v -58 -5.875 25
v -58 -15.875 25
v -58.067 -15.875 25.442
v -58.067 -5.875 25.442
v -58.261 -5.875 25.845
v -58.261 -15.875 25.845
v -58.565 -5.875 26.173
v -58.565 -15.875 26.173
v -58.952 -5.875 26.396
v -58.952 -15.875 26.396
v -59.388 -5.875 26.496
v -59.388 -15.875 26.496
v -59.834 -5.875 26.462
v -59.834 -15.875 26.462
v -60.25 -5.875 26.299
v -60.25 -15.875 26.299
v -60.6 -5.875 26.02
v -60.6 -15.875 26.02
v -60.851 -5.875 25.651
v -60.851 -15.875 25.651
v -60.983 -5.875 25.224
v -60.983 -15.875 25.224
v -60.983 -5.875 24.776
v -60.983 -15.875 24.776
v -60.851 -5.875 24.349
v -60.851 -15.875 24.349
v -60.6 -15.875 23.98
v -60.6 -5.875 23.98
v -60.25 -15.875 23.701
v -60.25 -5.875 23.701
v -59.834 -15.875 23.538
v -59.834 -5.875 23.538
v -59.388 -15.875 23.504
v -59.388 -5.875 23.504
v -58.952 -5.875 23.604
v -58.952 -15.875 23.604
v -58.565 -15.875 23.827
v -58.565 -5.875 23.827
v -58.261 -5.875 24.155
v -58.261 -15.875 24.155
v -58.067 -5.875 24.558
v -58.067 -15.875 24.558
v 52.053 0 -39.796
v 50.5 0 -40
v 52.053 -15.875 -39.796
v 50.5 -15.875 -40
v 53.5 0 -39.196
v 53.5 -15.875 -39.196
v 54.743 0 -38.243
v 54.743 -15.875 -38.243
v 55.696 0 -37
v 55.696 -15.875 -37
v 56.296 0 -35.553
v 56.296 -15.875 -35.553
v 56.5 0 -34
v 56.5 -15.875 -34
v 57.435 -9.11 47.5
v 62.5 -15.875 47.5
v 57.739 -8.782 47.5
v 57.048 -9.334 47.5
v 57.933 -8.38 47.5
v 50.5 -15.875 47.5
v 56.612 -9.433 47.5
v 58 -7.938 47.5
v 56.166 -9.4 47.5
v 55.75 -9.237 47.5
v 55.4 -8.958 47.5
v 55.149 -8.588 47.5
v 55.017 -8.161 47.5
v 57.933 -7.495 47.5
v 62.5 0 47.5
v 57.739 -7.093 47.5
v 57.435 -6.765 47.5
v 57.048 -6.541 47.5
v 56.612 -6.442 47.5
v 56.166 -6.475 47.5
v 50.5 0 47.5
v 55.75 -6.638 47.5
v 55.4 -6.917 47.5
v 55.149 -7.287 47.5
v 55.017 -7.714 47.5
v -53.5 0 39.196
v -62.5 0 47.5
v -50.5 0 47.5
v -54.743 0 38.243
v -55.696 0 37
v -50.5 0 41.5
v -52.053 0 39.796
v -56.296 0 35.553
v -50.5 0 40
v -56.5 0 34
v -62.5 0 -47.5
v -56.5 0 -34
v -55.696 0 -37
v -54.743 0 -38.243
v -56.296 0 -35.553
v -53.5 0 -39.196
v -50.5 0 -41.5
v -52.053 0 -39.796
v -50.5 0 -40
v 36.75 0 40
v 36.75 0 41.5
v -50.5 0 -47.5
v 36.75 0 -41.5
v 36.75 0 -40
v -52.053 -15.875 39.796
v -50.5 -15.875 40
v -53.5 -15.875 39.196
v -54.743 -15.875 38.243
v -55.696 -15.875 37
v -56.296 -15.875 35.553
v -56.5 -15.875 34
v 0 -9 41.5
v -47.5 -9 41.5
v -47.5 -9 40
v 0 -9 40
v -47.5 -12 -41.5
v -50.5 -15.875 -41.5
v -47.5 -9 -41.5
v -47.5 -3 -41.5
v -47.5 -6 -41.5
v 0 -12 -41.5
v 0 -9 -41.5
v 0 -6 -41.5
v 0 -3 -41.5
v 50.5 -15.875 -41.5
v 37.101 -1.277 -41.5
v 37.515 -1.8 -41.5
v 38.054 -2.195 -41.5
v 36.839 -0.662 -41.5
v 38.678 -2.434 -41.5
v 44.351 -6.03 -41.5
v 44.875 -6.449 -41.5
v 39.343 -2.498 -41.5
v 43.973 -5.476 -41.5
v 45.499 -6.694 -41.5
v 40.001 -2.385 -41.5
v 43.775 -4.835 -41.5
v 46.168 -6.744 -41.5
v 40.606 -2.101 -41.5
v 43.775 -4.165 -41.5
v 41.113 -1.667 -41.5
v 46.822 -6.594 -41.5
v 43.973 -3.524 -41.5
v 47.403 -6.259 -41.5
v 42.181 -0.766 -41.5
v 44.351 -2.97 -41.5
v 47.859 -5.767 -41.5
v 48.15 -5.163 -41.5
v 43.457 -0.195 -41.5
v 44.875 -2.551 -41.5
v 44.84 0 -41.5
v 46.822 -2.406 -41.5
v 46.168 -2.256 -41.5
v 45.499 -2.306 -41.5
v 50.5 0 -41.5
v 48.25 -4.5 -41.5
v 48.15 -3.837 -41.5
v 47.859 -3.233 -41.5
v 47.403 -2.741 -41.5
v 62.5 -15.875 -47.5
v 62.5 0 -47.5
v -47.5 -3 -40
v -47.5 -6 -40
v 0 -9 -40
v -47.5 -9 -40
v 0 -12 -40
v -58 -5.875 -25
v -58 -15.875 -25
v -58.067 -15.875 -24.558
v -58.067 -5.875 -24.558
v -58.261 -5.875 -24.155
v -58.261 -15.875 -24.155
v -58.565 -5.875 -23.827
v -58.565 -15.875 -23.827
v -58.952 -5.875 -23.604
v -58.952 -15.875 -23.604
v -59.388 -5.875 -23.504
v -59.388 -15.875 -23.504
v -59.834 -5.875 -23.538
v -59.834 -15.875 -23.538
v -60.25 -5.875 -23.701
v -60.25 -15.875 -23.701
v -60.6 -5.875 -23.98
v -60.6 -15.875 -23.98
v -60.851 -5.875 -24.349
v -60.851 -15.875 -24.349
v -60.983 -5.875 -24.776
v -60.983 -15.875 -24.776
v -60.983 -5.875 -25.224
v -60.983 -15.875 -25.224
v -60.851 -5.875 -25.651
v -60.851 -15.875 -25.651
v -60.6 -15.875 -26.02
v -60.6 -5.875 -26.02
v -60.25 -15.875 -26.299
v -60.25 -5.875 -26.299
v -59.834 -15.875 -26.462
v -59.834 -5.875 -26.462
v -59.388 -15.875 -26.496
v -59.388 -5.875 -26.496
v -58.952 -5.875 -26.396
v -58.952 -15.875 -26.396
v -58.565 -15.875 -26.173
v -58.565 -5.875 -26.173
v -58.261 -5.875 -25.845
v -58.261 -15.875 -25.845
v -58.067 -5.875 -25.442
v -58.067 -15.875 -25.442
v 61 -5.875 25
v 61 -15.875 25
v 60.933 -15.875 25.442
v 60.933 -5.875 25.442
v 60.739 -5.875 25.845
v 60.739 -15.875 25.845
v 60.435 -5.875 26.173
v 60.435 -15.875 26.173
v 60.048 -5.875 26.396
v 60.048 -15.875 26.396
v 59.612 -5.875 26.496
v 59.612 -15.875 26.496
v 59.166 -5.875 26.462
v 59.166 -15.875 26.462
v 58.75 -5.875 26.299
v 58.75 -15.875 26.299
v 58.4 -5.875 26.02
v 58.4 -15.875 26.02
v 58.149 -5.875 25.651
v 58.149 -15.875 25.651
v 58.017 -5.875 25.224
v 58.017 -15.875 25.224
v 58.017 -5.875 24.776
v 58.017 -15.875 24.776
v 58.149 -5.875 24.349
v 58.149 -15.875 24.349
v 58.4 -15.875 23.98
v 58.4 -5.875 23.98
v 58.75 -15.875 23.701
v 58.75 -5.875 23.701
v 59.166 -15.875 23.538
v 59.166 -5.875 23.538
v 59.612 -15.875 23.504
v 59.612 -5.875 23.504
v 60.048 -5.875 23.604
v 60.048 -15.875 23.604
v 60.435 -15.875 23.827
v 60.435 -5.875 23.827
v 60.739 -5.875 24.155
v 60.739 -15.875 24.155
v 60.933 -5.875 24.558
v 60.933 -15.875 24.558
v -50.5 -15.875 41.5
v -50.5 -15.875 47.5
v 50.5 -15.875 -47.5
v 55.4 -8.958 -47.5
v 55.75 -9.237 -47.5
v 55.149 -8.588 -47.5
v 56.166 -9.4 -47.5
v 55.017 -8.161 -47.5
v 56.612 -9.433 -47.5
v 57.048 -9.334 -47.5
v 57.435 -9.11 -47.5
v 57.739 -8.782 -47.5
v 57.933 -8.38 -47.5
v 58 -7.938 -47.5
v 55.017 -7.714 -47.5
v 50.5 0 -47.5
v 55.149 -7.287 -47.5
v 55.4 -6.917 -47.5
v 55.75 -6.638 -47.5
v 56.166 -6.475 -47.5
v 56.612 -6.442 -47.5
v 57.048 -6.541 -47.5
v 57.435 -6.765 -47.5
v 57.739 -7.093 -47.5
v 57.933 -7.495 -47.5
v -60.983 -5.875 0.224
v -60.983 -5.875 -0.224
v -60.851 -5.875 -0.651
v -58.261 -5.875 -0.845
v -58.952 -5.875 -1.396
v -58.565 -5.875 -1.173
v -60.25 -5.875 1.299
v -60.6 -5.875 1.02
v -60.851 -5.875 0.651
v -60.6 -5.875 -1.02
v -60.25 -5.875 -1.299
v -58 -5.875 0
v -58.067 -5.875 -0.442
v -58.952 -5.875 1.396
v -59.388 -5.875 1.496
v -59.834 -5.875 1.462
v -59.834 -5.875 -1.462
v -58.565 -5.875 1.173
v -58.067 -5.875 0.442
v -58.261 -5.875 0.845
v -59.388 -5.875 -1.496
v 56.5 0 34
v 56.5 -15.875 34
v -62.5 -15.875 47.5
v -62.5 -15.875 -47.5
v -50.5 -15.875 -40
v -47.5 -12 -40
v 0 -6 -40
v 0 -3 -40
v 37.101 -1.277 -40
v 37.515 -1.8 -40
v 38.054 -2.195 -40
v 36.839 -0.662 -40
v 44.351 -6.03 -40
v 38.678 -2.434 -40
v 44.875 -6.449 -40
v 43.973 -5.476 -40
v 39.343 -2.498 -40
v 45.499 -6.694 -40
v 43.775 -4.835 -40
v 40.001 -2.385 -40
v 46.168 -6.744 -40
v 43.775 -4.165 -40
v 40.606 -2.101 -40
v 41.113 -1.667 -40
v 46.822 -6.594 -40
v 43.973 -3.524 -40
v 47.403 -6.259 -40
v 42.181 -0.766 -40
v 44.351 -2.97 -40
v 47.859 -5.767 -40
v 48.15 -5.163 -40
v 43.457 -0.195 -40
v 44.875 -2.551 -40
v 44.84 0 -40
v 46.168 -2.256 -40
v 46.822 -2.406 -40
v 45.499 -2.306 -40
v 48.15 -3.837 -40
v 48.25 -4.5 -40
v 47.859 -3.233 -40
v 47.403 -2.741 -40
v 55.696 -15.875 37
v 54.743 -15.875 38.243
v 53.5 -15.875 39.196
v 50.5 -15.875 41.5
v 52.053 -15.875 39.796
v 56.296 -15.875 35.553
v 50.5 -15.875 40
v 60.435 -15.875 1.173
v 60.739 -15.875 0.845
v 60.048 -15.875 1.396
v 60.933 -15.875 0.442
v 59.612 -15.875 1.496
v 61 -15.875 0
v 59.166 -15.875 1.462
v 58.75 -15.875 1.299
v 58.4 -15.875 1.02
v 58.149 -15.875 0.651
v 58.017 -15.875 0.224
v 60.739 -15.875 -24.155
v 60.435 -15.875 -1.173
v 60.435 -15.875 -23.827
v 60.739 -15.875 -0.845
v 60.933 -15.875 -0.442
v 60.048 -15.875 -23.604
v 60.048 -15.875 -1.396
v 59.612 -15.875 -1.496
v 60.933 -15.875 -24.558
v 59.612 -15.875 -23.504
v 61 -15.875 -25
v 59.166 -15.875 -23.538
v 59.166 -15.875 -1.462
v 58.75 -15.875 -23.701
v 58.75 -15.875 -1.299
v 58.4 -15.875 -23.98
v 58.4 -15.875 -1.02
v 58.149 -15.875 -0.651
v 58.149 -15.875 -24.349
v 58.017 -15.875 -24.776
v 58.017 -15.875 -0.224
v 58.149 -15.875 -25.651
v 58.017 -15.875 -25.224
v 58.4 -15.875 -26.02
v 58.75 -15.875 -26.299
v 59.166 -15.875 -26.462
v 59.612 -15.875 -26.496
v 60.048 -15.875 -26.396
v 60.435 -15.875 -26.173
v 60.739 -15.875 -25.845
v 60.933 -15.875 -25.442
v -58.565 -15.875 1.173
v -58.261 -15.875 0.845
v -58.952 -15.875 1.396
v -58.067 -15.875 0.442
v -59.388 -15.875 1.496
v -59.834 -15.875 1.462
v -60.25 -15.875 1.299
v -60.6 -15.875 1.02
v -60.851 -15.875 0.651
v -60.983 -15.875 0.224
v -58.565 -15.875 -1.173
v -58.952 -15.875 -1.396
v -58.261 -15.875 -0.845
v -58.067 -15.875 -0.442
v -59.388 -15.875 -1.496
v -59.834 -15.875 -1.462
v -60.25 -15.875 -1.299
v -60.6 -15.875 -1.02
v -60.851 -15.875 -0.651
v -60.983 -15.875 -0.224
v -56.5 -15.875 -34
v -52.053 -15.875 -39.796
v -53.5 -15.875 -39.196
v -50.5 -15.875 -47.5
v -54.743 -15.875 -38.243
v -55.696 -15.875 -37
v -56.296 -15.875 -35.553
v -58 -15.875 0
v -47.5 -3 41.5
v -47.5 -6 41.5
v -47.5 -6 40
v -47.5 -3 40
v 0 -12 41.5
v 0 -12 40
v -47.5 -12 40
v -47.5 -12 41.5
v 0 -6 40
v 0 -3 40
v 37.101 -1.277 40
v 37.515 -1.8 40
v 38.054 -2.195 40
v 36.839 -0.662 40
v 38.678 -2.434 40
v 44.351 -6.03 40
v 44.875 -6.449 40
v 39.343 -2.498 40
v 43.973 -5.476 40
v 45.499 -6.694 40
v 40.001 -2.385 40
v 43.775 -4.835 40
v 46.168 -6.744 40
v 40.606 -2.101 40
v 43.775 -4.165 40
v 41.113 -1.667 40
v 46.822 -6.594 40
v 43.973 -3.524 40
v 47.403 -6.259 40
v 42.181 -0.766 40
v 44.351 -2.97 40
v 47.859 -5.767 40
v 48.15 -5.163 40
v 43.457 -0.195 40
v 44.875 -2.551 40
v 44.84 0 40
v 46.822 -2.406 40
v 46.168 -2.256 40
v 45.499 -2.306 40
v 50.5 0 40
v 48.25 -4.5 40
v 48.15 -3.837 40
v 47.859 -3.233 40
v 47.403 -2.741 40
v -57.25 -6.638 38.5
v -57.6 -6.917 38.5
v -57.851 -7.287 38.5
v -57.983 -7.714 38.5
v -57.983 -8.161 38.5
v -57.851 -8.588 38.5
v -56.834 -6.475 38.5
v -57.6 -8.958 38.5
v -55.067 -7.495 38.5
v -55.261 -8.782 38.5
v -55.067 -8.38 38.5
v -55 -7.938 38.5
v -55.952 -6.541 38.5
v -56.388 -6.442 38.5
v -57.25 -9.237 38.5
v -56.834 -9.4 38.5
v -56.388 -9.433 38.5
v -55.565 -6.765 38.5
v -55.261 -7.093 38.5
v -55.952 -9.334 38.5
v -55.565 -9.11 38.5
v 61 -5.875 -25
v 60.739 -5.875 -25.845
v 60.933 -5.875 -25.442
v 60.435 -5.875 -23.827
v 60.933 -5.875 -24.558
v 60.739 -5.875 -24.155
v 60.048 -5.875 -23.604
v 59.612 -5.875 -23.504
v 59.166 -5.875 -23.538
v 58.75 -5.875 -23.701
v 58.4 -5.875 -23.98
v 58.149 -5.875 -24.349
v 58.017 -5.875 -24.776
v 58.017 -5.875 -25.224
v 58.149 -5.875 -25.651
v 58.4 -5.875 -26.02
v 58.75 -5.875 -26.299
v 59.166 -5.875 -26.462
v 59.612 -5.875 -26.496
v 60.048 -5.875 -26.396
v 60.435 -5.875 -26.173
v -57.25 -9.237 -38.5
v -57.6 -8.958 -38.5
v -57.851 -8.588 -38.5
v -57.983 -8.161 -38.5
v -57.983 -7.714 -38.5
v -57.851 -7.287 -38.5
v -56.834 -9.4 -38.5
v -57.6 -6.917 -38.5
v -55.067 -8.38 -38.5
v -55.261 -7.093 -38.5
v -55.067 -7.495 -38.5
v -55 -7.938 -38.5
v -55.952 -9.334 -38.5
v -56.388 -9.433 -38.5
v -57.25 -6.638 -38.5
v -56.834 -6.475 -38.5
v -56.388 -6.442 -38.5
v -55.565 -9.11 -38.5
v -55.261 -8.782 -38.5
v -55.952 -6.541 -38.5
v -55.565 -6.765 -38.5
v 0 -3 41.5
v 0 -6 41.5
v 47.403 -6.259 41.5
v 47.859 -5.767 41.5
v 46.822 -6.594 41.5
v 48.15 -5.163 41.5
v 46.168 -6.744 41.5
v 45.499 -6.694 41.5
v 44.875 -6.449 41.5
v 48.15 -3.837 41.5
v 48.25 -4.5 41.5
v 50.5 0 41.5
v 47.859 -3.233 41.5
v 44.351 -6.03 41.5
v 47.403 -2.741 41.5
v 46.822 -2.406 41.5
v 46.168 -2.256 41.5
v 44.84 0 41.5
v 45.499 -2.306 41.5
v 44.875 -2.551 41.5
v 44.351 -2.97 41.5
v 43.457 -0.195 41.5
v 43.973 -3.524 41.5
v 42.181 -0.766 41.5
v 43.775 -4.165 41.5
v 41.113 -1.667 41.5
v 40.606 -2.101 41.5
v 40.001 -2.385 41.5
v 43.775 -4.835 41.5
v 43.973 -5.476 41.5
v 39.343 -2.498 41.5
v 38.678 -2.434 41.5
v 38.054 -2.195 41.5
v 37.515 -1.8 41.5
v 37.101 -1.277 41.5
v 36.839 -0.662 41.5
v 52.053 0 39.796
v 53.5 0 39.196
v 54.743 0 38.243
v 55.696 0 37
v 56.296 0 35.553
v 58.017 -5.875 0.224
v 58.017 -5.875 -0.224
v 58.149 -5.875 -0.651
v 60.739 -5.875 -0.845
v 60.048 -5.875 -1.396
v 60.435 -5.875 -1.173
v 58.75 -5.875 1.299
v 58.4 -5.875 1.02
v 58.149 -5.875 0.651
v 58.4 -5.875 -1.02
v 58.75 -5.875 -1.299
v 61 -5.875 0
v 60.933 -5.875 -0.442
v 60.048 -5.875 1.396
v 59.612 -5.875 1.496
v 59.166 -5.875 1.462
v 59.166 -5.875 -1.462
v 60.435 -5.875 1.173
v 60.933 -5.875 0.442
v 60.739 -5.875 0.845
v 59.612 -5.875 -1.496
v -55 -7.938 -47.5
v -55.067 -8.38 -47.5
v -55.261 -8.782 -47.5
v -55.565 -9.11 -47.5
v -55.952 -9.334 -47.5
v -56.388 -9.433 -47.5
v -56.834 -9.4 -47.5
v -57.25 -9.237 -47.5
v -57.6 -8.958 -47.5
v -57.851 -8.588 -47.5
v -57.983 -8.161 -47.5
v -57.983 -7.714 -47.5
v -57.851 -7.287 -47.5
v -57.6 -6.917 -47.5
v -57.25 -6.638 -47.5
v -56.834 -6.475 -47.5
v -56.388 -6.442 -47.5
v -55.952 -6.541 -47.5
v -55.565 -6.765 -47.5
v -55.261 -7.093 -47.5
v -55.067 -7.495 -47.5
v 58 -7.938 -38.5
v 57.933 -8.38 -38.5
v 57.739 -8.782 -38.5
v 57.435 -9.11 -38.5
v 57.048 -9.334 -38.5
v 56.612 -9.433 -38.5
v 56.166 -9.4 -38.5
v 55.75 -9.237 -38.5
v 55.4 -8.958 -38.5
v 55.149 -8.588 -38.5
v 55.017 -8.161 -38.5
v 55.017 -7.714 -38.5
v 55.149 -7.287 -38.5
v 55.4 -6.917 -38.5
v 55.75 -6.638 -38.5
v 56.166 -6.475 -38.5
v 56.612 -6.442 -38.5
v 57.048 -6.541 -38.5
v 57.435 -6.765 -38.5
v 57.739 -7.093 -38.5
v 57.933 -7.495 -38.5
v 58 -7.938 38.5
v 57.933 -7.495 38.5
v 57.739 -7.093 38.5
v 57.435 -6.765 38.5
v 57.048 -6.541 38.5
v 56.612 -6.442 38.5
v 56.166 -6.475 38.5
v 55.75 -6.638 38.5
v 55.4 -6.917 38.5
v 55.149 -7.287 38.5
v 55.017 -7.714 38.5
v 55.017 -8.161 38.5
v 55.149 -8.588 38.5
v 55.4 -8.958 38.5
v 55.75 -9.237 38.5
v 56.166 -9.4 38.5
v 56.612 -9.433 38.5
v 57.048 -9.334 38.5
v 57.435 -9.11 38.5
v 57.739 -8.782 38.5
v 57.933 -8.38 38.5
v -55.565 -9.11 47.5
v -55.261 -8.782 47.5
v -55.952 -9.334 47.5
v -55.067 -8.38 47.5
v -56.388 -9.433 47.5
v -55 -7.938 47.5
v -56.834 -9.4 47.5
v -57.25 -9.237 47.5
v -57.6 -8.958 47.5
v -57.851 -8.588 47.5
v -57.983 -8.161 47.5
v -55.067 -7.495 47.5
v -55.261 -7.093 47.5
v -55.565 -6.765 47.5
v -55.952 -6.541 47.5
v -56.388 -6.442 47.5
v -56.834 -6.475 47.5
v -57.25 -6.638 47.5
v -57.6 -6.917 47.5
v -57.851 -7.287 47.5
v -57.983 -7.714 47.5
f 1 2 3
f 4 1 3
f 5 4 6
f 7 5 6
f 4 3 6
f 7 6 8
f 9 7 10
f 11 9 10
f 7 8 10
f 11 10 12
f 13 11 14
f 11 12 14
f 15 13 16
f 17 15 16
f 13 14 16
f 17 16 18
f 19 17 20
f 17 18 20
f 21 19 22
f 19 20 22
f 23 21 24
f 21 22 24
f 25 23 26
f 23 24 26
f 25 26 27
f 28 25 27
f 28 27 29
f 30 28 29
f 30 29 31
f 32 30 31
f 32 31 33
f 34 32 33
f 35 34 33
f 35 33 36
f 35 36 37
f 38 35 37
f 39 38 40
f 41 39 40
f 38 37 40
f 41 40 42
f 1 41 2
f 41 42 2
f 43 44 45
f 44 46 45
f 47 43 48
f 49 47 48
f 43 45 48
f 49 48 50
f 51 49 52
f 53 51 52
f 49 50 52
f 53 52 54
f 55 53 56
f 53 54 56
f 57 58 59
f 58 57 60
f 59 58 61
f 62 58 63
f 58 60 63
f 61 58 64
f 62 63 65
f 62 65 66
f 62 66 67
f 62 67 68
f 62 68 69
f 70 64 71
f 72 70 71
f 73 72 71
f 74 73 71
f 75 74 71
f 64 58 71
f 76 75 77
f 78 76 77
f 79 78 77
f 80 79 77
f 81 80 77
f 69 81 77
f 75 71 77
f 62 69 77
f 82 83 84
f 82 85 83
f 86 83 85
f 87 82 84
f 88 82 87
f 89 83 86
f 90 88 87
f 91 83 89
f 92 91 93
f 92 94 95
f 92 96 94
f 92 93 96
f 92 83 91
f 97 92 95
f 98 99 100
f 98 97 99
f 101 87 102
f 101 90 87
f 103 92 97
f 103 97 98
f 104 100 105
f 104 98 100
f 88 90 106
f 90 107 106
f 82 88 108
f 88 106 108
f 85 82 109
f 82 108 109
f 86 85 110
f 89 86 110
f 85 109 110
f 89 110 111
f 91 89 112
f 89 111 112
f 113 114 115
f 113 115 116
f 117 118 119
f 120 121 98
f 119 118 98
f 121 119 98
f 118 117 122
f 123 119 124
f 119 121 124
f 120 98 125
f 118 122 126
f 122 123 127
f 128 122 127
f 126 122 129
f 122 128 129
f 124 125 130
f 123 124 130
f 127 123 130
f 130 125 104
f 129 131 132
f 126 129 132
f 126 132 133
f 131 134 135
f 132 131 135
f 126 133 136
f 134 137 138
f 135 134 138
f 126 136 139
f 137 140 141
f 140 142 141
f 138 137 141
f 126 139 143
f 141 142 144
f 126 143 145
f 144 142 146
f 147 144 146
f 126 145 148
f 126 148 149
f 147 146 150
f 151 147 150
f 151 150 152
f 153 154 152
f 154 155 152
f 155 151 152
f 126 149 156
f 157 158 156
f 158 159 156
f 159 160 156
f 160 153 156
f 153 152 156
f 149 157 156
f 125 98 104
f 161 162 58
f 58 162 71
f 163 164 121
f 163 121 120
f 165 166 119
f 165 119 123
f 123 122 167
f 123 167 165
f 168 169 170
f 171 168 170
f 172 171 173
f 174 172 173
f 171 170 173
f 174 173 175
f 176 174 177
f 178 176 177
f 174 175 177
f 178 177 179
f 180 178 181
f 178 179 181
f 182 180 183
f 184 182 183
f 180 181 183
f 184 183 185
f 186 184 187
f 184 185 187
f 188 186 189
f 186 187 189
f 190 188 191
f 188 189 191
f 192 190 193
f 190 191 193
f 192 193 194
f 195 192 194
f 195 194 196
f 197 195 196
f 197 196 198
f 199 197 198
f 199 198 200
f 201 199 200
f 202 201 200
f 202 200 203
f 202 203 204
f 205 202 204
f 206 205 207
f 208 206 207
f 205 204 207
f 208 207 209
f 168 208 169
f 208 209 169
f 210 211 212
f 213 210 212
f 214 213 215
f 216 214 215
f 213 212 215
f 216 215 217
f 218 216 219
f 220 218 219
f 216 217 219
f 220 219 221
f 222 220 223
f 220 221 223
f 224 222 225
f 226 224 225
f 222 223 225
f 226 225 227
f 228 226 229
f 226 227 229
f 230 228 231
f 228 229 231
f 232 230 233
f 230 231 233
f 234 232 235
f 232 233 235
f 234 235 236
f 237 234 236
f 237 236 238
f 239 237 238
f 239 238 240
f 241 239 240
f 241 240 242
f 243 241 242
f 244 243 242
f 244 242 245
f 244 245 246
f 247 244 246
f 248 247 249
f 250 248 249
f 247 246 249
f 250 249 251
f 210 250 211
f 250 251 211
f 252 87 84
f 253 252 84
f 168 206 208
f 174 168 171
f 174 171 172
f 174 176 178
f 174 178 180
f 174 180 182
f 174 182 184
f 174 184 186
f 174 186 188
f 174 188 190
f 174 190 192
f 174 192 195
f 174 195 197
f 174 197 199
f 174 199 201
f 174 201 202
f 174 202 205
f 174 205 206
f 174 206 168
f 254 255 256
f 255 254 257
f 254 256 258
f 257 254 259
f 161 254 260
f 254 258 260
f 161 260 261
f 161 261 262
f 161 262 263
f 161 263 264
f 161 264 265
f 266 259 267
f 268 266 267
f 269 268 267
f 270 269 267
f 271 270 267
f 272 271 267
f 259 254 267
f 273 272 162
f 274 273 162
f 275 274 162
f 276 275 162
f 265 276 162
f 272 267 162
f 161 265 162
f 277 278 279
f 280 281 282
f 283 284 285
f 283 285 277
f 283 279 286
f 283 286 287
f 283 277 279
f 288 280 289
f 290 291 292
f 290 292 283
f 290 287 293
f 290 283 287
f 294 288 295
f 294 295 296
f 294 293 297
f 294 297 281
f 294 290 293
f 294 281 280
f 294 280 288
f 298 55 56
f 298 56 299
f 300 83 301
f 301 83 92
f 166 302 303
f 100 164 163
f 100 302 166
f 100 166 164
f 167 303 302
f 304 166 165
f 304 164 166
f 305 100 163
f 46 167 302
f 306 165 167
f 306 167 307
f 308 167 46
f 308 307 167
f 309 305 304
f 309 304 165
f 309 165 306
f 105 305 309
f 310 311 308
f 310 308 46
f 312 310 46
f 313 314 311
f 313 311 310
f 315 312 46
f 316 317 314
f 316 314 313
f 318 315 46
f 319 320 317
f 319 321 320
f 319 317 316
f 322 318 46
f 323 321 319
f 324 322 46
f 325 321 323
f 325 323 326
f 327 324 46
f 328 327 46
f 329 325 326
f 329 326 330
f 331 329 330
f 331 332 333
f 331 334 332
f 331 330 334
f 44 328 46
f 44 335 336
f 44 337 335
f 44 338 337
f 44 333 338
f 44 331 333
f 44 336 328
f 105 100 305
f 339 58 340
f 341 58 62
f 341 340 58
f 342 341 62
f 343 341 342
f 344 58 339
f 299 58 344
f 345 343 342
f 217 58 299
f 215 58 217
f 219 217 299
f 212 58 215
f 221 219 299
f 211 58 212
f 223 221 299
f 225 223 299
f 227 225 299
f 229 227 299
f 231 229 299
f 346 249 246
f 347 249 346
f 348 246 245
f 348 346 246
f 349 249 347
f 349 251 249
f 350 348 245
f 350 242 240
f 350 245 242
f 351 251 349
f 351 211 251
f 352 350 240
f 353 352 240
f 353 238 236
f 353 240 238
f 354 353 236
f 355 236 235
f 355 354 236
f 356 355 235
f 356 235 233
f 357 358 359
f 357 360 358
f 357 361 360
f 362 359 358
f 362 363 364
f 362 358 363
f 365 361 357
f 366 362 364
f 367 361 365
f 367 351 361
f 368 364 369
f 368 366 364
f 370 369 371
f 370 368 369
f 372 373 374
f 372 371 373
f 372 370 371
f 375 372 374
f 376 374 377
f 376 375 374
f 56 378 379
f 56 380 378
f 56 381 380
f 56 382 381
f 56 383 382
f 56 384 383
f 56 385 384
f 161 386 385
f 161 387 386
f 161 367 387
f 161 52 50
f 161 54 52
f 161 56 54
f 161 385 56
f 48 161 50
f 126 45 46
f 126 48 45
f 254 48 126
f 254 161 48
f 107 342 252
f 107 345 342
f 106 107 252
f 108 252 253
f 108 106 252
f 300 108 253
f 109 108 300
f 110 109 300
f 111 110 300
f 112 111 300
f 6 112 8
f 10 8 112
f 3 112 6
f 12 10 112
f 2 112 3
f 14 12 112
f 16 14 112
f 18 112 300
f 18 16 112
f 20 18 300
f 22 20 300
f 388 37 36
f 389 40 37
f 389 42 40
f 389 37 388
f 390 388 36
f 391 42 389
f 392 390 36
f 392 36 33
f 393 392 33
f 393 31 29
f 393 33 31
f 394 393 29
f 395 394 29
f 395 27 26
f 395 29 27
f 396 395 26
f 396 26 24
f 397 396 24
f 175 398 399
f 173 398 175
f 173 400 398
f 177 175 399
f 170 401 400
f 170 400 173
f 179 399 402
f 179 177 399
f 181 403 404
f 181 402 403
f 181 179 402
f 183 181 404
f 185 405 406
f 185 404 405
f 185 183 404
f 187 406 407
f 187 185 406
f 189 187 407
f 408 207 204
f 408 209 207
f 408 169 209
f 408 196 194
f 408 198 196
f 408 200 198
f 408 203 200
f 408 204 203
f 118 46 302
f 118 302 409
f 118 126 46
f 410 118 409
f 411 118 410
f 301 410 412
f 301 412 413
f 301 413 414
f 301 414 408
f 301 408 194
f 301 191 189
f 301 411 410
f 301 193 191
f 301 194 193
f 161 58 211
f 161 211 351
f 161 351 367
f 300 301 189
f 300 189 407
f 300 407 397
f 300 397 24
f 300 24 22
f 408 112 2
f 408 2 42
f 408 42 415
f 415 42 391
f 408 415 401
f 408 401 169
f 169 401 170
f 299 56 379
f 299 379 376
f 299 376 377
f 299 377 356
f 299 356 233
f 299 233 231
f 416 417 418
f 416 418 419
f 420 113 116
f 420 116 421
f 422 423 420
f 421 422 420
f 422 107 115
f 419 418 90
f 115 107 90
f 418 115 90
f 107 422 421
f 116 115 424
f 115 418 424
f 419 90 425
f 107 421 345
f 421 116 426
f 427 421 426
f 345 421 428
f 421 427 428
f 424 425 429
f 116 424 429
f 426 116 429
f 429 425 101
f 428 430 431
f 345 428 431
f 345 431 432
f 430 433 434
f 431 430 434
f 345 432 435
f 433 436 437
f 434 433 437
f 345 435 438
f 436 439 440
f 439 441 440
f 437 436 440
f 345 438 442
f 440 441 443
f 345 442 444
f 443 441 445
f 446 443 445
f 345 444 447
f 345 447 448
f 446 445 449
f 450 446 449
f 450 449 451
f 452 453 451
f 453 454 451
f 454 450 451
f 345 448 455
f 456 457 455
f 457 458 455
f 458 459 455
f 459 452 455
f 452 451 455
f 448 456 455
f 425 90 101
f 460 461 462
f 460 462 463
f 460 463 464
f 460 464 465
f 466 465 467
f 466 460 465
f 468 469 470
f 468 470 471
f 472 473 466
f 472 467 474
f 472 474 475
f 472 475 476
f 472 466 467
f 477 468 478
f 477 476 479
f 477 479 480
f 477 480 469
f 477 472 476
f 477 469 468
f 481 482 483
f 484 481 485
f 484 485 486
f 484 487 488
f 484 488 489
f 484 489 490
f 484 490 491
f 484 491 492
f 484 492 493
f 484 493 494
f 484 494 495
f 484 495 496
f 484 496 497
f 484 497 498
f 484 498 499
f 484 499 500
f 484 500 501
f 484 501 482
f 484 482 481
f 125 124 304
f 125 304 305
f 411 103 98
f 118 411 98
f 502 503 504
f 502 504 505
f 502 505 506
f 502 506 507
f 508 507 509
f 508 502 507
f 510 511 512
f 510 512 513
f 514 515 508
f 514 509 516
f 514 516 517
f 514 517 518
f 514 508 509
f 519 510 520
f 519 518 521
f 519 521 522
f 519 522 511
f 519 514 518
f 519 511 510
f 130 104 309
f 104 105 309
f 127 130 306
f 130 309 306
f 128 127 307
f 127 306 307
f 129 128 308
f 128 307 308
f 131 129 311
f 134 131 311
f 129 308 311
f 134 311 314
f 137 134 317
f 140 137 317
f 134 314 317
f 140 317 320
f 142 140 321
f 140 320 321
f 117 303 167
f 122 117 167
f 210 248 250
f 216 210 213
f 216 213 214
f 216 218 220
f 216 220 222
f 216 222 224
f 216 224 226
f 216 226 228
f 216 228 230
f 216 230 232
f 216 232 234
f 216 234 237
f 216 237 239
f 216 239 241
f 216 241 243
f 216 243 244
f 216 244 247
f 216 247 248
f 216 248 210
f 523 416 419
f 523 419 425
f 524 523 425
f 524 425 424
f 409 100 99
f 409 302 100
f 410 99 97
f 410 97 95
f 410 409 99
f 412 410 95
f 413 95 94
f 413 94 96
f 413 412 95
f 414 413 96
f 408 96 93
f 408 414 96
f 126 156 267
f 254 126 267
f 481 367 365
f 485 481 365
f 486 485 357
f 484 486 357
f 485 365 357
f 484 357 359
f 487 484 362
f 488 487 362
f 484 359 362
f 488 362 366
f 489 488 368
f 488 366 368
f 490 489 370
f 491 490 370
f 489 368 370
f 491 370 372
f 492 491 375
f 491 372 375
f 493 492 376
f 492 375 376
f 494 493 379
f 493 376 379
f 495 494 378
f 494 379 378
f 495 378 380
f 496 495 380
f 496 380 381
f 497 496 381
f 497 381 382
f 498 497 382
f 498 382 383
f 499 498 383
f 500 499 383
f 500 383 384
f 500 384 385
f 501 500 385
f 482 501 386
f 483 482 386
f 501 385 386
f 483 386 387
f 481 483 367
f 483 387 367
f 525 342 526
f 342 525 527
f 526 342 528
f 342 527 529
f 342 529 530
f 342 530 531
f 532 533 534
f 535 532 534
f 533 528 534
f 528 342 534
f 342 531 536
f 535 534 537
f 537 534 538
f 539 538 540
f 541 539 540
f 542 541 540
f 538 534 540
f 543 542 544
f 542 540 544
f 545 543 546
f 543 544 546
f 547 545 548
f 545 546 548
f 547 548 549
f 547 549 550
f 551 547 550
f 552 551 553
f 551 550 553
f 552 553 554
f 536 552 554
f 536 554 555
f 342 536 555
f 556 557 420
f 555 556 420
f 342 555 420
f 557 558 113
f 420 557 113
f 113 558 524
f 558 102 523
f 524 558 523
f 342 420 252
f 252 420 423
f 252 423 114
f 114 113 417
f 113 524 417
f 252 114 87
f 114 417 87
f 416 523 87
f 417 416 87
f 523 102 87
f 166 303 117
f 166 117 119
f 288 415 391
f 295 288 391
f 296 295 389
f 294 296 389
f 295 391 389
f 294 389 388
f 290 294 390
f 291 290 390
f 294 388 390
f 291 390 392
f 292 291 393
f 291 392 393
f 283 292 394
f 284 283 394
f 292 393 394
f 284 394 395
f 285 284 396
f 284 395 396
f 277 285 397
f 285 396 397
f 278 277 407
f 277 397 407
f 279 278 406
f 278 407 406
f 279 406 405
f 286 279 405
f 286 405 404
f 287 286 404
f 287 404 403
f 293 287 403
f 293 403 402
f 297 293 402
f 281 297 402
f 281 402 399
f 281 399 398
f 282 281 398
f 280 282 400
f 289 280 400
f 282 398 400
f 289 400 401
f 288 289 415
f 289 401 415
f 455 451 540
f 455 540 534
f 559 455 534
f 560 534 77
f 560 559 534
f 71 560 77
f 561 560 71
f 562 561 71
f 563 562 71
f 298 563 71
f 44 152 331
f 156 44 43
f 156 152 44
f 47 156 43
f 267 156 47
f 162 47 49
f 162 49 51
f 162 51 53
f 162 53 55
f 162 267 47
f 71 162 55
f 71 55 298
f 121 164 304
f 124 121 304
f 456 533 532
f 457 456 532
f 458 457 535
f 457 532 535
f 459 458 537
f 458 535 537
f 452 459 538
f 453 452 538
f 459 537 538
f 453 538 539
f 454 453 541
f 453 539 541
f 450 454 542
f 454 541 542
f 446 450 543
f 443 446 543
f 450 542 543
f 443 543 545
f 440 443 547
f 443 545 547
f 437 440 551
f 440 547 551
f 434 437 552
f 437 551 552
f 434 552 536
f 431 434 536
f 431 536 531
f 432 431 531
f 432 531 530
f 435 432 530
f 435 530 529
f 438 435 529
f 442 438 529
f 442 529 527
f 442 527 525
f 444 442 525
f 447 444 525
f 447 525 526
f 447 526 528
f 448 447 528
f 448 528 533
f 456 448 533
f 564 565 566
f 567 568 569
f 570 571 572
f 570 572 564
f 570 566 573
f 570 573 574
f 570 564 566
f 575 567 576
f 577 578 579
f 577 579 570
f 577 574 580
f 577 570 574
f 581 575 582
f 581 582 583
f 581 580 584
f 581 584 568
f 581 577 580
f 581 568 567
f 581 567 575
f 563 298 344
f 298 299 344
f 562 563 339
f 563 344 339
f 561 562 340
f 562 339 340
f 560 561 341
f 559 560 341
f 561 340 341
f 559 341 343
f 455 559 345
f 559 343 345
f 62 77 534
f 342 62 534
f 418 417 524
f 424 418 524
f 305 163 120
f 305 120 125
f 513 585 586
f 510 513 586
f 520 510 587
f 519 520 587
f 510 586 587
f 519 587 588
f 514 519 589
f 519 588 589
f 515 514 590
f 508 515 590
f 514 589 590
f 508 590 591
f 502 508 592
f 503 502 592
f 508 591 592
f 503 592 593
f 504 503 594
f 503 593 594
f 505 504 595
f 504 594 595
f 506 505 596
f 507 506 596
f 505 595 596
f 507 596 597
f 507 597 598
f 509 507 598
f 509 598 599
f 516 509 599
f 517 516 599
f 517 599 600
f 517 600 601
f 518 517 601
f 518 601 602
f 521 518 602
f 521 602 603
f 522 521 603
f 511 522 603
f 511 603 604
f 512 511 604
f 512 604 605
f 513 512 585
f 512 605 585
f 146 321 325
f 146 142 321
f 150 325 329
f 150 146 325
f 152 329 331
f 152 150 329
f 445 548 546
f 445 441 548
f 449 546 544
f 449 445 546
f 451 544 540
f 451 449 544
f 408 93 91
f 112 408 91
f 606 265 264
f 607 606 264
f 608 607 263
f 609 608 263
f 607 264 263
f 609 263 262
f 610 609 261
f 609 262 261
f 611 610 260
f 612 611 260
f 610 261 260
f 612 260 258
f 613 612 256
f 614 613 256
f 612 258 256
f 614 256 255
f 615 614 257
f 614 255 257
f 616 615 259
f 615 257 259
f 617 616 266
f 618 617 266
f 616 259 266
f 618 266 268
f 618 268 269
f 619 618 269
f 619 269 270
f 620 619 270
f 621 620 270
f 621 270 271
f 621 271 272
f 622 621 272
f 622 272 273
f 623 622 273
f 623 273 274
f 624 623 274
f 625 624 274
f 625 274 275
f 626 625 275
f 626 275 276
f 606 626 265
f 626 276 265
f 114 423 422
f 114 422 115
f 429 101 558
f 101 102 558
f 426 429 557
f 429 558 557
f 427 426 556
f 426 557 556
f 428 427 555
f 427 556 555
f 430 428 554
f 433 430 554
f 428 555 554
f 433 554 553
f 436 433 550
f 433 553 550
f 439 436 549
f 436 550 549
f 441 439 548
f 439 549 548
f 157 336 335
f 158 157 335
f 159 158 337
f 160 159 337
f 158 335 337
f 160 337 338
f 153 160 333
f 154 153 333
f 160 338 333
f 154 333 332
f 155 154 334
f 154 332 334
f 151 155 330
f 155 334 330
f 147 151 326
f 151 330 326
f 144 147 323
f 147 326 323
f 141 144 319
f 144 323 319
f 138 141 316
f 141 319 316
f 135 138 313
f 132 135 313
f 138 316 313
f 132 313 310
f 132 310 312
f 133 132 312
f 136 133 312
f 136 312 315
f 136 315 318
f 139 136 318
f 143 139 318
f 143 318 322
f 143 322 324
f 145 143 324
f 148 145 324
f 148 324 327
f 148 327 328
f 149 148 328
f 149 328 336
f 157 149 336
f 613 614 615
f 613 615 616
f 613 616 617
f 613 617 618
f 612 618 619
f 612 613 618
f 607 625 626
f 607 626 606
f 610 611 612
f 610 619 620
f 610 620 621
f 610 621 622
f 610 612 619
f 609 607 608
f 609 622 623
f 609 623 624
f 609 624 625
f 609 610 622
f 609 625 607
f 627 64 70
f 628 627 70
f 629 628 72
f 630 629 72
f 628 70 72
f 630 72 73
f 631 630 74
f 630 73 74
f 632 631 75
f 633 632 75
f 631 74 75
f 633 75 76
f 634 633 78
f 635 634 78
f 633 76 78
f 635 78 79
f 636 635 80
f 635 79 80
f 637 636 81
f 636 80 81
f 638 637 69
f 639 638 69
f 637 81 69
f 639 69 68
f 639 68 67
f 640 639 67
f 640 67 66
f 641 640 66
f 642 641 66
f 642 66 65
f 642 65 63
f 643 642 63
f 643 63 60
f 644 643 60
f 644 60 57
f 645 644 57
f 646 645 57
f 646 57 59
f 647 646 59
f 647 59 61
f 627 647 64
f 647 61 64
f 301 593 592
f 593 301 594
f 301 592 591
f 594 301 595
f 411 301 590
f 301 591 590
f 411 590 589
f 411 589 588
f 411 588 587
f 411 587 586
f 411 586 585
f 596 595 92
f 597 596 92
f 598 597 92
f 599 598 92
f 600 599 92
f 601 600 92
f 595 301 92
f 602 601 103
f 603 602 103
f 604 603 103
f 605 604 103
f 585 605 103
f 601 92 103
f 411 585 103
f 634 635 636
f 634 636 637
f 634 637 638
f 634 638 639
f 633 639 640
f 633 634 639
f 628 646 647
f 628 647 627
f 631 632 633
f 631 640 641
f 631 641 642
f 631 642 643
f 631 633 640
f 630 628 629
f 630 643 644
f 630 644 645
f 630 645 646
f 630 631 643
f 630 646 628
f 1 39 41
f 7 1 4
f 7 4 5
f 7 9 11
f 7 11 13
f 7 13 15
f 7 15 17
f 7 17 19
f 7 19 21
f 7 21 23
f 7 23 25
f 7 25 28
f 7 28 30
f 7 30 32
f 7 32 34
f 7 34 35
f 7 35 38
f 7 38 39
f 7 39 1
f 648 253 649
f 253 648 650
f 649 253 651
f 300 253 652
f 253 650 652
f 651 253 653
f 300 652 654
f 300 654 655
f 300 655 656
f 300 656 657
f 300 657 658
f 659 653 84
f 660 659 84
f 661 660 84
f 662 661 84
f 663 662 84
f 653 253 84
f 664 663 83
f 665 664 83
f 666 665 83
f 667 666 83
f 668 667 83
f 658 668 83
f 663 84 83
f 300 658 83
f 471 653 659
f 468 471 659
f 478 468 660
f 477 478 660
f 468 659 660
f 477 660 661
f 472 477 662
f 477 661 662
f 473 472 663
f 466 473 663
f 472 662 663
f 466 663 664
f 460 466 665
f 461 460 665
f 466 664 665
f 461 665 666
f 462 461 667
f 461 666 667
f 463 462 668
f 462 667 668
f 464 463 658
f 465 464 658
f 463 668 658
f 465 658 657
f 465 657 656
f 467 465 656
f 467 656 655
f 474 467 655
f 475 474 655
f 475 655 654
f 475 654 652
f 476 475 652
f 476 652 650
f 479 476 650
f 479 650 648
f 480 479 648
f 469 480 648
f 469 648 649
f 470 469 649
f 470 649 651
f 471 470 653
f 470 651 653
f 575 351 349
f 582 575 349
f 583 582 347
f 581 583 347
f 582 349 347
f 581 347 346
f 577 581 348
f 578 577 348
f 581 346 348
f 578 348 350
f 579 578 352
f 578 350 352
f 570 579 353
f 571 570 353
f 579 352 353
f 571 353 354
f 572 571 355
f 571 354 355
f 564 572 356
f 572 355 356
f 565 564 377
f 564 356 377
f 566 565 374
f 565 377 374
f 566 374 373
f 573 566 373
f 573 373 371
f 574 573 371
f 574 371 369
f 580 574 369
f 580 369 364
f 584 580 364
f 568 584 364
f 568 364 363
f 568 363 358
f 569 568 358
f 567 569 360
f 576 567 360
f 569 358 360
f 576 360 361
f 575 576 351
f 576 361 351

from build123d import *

# Parameters (mm, degrees)
F0_W      = 113
F0_H      = 80
F1_DEPTH  = 15.875
F2_R      = 6
F3_W      = 89
F3_H      = 3
F3_W_2    = 95
F3_R      = 1.5
F4_DEPTH  = 132
F5_R      = 1.5
F6_DEPTH  = 10
F7_W      = 42.9403819144
F7_H      = 7.4070980772
F8_DEPTH  = 1.5
F9_W      = 42.8083911538
F9_H      = 7.2430414148
F10_DEPTH = 1.5
F11_R     = 2.5
F12_DEPTH = 92
F13_R     = 2.25
F14_DEPTH = 200
F15_R     = 5
F16_R     = 1.5
F17_DEPTH = 9
F18_R     = 1.5
F19_DEPTH = 9
F20_R     = 1.5
F21_DEPTH = 9
F22_R     = 1.5
F23_DEPTH = 9


with BuildPart() as f1:
    # F0 (on Front) → F1 (new body)
    with BuildSketch(Plane.XZ):
        Polygon((-50.5, 47.5), (-62.5, 47.5), (-62.5, -47.5), (-50.5, -47.5), (-50.5, -41.5), (50.5, -41.5), (50.5, -47.5), (62.5, -47.5), (62.5, 47.5), (50.5, 47.5), (50.5, 41.5), (-50.5, 41.5), align=None)
        Rectangle(F0_W, F0_H, mode=Mode.SUBTRACT)
    extrude(amount=F1_DEPTH)

    # F2
    f2_edges = [f1.edges().sort_by_distance(p)[0] for p in [
        (56.5, -7.9375, 40),
        (56.5, -7.9375, -40),
        (-56.5, -7.9375, -40),
        (-56.5, -7.9375, 40),
    ]]
    fillet(f2_edges, radius=F2_R)

    # F3 (on face) → F4 (cut)
    with BuildSketch(Plane.XY.offset(41.5)):
        with Locations((-3, -4.5)):
            Rectangle(F3_W, F3_H)
        with Locations((0, -10.5)):
            Rectangle(F3_W_2, F3_H)
        with Locations((46, -4.5)):
            Circle(F3_R)
    extrude(amount=-F4_DEPTH, mode=Mode.SUBTRACT)

    # F5 (on face) → F6 (cut)
    with BuildSketch(Plane.XZ.offset(15.875)):
        with Locations((-59.5, 0)):
            Circle(F5_R)
        with Locations((59.5, 0)):
            Circle(F5_R)
        with Locations((59.5, -25)):
            Circle(F5_R)
        with Locations((59.5, 25)):
            Circle(F5_R)
        with Locations((-59.5, 25)):
            Circle(F5_R)
        with Locations((-59.5, -25)):
            Circle(F5_R)
    extrude(amount=-F6_DEPTH, mode=Mode.SUBTRACT)

    # F7 (on face) → F8 (join)
    with BuildSketch(Plane.XY.offset(41.5)):
        with Locations((21.4701909572, -3.7035490386)):
            Rectangle(F7_W, F7_H)
        Polygon((42.9403819144, -7.4070980772), (0, -7.4070980772), (0, -14.1382440925), (49.1435937583, -14.1382440925), (49.1435937583, -7.4070980772), align=None)
    extrude(amount=-F8_DEPTH)

    # F9 (on face) → F10 (join)
    with BuildSketch(Plane(origin=(0, 0, -41.5), x_dir=(1, 0, 0), z_dir=(0, 0, -1))):
        Polygon((49.0116067231, 15.875), (0, 15.875), (0, 7.2430414148), (42.8083911538, 7.2430414148), (49.0116067231, 7.2430414148), align=None)
        with Locations((21.4041955769, 3.6215207074)):
            Rectangle(F9_W, F9_H)
    extrude(amount=-F10_DEPTH)

    # F11 (on face) → F12 (cut)
    with BuildSketch(Plane.XY.offset(41.5)):
        with Locations((39.25, 0)):
            Circle(F11_R)
    extrude(amount=-F12_DEPTH, mode=Mode.SUBTRACT)

    # F13 (on face) → F14 (cut)
    with BuildSketch(Plane.XY.offset(41.5)):
        with Locations((46, -4.5)):
            Circle(F13_R)
    extrude(amount=-F14_DEPTH, mode=Mode.SUBTRACT)

    # F15
    f15_edges = [f1.edges().sort_by_distance(p)[0] for p in [
        (41.75, 0, 40.75),
        (41.75, 0, -40.75),
    ]]
    fillet(f15_edges, radius=F15_R)

    # F16 (on face) → F17 (cut)
    with BuildSketch(Plane.XY.offset(47.5)):
        with Locations((-56.5, -7.9375)):
            Circle(F16_R)
    extrude(amount=-F17_DEPTH, mode=Mode.SUBTRACT)

    # F18 (on face) → F19 (cut)
    with BuildSketch(Plane.XY.offset(47.5)):
        with Locations((56.5, -7.9375)):
            Circle(F18_R)
    extrude(amount=-F19_DEPTH, mode=Mode.SUBTRACT)

    # F20 (on face) → F21 (cut)
    with BuildSketch(Plane(origin=(0, 0, -47.5), x_dir=(1, 0, 0), z_dir=(0, 0, -1))):
        with Locations((-56.5, 7.9375)):
            Circle(F20_R)
    extrude(amount=-F21_DEPTH, mode=Mode.SUBTRACT)

    # F22 (on face) → F23 (cut)
    with BuildSketch(Plane(origin=(0, 0, -47.5), x_dir=(1, 0, 0), z_dir=(0, 0, -1))):
        with Locations((56.5, 7.9375)):
            Circle(F22_R)
    extrude(amount=-F23_DEPTH, mode=Mode.SUBTRACT)


solid = f1.part
